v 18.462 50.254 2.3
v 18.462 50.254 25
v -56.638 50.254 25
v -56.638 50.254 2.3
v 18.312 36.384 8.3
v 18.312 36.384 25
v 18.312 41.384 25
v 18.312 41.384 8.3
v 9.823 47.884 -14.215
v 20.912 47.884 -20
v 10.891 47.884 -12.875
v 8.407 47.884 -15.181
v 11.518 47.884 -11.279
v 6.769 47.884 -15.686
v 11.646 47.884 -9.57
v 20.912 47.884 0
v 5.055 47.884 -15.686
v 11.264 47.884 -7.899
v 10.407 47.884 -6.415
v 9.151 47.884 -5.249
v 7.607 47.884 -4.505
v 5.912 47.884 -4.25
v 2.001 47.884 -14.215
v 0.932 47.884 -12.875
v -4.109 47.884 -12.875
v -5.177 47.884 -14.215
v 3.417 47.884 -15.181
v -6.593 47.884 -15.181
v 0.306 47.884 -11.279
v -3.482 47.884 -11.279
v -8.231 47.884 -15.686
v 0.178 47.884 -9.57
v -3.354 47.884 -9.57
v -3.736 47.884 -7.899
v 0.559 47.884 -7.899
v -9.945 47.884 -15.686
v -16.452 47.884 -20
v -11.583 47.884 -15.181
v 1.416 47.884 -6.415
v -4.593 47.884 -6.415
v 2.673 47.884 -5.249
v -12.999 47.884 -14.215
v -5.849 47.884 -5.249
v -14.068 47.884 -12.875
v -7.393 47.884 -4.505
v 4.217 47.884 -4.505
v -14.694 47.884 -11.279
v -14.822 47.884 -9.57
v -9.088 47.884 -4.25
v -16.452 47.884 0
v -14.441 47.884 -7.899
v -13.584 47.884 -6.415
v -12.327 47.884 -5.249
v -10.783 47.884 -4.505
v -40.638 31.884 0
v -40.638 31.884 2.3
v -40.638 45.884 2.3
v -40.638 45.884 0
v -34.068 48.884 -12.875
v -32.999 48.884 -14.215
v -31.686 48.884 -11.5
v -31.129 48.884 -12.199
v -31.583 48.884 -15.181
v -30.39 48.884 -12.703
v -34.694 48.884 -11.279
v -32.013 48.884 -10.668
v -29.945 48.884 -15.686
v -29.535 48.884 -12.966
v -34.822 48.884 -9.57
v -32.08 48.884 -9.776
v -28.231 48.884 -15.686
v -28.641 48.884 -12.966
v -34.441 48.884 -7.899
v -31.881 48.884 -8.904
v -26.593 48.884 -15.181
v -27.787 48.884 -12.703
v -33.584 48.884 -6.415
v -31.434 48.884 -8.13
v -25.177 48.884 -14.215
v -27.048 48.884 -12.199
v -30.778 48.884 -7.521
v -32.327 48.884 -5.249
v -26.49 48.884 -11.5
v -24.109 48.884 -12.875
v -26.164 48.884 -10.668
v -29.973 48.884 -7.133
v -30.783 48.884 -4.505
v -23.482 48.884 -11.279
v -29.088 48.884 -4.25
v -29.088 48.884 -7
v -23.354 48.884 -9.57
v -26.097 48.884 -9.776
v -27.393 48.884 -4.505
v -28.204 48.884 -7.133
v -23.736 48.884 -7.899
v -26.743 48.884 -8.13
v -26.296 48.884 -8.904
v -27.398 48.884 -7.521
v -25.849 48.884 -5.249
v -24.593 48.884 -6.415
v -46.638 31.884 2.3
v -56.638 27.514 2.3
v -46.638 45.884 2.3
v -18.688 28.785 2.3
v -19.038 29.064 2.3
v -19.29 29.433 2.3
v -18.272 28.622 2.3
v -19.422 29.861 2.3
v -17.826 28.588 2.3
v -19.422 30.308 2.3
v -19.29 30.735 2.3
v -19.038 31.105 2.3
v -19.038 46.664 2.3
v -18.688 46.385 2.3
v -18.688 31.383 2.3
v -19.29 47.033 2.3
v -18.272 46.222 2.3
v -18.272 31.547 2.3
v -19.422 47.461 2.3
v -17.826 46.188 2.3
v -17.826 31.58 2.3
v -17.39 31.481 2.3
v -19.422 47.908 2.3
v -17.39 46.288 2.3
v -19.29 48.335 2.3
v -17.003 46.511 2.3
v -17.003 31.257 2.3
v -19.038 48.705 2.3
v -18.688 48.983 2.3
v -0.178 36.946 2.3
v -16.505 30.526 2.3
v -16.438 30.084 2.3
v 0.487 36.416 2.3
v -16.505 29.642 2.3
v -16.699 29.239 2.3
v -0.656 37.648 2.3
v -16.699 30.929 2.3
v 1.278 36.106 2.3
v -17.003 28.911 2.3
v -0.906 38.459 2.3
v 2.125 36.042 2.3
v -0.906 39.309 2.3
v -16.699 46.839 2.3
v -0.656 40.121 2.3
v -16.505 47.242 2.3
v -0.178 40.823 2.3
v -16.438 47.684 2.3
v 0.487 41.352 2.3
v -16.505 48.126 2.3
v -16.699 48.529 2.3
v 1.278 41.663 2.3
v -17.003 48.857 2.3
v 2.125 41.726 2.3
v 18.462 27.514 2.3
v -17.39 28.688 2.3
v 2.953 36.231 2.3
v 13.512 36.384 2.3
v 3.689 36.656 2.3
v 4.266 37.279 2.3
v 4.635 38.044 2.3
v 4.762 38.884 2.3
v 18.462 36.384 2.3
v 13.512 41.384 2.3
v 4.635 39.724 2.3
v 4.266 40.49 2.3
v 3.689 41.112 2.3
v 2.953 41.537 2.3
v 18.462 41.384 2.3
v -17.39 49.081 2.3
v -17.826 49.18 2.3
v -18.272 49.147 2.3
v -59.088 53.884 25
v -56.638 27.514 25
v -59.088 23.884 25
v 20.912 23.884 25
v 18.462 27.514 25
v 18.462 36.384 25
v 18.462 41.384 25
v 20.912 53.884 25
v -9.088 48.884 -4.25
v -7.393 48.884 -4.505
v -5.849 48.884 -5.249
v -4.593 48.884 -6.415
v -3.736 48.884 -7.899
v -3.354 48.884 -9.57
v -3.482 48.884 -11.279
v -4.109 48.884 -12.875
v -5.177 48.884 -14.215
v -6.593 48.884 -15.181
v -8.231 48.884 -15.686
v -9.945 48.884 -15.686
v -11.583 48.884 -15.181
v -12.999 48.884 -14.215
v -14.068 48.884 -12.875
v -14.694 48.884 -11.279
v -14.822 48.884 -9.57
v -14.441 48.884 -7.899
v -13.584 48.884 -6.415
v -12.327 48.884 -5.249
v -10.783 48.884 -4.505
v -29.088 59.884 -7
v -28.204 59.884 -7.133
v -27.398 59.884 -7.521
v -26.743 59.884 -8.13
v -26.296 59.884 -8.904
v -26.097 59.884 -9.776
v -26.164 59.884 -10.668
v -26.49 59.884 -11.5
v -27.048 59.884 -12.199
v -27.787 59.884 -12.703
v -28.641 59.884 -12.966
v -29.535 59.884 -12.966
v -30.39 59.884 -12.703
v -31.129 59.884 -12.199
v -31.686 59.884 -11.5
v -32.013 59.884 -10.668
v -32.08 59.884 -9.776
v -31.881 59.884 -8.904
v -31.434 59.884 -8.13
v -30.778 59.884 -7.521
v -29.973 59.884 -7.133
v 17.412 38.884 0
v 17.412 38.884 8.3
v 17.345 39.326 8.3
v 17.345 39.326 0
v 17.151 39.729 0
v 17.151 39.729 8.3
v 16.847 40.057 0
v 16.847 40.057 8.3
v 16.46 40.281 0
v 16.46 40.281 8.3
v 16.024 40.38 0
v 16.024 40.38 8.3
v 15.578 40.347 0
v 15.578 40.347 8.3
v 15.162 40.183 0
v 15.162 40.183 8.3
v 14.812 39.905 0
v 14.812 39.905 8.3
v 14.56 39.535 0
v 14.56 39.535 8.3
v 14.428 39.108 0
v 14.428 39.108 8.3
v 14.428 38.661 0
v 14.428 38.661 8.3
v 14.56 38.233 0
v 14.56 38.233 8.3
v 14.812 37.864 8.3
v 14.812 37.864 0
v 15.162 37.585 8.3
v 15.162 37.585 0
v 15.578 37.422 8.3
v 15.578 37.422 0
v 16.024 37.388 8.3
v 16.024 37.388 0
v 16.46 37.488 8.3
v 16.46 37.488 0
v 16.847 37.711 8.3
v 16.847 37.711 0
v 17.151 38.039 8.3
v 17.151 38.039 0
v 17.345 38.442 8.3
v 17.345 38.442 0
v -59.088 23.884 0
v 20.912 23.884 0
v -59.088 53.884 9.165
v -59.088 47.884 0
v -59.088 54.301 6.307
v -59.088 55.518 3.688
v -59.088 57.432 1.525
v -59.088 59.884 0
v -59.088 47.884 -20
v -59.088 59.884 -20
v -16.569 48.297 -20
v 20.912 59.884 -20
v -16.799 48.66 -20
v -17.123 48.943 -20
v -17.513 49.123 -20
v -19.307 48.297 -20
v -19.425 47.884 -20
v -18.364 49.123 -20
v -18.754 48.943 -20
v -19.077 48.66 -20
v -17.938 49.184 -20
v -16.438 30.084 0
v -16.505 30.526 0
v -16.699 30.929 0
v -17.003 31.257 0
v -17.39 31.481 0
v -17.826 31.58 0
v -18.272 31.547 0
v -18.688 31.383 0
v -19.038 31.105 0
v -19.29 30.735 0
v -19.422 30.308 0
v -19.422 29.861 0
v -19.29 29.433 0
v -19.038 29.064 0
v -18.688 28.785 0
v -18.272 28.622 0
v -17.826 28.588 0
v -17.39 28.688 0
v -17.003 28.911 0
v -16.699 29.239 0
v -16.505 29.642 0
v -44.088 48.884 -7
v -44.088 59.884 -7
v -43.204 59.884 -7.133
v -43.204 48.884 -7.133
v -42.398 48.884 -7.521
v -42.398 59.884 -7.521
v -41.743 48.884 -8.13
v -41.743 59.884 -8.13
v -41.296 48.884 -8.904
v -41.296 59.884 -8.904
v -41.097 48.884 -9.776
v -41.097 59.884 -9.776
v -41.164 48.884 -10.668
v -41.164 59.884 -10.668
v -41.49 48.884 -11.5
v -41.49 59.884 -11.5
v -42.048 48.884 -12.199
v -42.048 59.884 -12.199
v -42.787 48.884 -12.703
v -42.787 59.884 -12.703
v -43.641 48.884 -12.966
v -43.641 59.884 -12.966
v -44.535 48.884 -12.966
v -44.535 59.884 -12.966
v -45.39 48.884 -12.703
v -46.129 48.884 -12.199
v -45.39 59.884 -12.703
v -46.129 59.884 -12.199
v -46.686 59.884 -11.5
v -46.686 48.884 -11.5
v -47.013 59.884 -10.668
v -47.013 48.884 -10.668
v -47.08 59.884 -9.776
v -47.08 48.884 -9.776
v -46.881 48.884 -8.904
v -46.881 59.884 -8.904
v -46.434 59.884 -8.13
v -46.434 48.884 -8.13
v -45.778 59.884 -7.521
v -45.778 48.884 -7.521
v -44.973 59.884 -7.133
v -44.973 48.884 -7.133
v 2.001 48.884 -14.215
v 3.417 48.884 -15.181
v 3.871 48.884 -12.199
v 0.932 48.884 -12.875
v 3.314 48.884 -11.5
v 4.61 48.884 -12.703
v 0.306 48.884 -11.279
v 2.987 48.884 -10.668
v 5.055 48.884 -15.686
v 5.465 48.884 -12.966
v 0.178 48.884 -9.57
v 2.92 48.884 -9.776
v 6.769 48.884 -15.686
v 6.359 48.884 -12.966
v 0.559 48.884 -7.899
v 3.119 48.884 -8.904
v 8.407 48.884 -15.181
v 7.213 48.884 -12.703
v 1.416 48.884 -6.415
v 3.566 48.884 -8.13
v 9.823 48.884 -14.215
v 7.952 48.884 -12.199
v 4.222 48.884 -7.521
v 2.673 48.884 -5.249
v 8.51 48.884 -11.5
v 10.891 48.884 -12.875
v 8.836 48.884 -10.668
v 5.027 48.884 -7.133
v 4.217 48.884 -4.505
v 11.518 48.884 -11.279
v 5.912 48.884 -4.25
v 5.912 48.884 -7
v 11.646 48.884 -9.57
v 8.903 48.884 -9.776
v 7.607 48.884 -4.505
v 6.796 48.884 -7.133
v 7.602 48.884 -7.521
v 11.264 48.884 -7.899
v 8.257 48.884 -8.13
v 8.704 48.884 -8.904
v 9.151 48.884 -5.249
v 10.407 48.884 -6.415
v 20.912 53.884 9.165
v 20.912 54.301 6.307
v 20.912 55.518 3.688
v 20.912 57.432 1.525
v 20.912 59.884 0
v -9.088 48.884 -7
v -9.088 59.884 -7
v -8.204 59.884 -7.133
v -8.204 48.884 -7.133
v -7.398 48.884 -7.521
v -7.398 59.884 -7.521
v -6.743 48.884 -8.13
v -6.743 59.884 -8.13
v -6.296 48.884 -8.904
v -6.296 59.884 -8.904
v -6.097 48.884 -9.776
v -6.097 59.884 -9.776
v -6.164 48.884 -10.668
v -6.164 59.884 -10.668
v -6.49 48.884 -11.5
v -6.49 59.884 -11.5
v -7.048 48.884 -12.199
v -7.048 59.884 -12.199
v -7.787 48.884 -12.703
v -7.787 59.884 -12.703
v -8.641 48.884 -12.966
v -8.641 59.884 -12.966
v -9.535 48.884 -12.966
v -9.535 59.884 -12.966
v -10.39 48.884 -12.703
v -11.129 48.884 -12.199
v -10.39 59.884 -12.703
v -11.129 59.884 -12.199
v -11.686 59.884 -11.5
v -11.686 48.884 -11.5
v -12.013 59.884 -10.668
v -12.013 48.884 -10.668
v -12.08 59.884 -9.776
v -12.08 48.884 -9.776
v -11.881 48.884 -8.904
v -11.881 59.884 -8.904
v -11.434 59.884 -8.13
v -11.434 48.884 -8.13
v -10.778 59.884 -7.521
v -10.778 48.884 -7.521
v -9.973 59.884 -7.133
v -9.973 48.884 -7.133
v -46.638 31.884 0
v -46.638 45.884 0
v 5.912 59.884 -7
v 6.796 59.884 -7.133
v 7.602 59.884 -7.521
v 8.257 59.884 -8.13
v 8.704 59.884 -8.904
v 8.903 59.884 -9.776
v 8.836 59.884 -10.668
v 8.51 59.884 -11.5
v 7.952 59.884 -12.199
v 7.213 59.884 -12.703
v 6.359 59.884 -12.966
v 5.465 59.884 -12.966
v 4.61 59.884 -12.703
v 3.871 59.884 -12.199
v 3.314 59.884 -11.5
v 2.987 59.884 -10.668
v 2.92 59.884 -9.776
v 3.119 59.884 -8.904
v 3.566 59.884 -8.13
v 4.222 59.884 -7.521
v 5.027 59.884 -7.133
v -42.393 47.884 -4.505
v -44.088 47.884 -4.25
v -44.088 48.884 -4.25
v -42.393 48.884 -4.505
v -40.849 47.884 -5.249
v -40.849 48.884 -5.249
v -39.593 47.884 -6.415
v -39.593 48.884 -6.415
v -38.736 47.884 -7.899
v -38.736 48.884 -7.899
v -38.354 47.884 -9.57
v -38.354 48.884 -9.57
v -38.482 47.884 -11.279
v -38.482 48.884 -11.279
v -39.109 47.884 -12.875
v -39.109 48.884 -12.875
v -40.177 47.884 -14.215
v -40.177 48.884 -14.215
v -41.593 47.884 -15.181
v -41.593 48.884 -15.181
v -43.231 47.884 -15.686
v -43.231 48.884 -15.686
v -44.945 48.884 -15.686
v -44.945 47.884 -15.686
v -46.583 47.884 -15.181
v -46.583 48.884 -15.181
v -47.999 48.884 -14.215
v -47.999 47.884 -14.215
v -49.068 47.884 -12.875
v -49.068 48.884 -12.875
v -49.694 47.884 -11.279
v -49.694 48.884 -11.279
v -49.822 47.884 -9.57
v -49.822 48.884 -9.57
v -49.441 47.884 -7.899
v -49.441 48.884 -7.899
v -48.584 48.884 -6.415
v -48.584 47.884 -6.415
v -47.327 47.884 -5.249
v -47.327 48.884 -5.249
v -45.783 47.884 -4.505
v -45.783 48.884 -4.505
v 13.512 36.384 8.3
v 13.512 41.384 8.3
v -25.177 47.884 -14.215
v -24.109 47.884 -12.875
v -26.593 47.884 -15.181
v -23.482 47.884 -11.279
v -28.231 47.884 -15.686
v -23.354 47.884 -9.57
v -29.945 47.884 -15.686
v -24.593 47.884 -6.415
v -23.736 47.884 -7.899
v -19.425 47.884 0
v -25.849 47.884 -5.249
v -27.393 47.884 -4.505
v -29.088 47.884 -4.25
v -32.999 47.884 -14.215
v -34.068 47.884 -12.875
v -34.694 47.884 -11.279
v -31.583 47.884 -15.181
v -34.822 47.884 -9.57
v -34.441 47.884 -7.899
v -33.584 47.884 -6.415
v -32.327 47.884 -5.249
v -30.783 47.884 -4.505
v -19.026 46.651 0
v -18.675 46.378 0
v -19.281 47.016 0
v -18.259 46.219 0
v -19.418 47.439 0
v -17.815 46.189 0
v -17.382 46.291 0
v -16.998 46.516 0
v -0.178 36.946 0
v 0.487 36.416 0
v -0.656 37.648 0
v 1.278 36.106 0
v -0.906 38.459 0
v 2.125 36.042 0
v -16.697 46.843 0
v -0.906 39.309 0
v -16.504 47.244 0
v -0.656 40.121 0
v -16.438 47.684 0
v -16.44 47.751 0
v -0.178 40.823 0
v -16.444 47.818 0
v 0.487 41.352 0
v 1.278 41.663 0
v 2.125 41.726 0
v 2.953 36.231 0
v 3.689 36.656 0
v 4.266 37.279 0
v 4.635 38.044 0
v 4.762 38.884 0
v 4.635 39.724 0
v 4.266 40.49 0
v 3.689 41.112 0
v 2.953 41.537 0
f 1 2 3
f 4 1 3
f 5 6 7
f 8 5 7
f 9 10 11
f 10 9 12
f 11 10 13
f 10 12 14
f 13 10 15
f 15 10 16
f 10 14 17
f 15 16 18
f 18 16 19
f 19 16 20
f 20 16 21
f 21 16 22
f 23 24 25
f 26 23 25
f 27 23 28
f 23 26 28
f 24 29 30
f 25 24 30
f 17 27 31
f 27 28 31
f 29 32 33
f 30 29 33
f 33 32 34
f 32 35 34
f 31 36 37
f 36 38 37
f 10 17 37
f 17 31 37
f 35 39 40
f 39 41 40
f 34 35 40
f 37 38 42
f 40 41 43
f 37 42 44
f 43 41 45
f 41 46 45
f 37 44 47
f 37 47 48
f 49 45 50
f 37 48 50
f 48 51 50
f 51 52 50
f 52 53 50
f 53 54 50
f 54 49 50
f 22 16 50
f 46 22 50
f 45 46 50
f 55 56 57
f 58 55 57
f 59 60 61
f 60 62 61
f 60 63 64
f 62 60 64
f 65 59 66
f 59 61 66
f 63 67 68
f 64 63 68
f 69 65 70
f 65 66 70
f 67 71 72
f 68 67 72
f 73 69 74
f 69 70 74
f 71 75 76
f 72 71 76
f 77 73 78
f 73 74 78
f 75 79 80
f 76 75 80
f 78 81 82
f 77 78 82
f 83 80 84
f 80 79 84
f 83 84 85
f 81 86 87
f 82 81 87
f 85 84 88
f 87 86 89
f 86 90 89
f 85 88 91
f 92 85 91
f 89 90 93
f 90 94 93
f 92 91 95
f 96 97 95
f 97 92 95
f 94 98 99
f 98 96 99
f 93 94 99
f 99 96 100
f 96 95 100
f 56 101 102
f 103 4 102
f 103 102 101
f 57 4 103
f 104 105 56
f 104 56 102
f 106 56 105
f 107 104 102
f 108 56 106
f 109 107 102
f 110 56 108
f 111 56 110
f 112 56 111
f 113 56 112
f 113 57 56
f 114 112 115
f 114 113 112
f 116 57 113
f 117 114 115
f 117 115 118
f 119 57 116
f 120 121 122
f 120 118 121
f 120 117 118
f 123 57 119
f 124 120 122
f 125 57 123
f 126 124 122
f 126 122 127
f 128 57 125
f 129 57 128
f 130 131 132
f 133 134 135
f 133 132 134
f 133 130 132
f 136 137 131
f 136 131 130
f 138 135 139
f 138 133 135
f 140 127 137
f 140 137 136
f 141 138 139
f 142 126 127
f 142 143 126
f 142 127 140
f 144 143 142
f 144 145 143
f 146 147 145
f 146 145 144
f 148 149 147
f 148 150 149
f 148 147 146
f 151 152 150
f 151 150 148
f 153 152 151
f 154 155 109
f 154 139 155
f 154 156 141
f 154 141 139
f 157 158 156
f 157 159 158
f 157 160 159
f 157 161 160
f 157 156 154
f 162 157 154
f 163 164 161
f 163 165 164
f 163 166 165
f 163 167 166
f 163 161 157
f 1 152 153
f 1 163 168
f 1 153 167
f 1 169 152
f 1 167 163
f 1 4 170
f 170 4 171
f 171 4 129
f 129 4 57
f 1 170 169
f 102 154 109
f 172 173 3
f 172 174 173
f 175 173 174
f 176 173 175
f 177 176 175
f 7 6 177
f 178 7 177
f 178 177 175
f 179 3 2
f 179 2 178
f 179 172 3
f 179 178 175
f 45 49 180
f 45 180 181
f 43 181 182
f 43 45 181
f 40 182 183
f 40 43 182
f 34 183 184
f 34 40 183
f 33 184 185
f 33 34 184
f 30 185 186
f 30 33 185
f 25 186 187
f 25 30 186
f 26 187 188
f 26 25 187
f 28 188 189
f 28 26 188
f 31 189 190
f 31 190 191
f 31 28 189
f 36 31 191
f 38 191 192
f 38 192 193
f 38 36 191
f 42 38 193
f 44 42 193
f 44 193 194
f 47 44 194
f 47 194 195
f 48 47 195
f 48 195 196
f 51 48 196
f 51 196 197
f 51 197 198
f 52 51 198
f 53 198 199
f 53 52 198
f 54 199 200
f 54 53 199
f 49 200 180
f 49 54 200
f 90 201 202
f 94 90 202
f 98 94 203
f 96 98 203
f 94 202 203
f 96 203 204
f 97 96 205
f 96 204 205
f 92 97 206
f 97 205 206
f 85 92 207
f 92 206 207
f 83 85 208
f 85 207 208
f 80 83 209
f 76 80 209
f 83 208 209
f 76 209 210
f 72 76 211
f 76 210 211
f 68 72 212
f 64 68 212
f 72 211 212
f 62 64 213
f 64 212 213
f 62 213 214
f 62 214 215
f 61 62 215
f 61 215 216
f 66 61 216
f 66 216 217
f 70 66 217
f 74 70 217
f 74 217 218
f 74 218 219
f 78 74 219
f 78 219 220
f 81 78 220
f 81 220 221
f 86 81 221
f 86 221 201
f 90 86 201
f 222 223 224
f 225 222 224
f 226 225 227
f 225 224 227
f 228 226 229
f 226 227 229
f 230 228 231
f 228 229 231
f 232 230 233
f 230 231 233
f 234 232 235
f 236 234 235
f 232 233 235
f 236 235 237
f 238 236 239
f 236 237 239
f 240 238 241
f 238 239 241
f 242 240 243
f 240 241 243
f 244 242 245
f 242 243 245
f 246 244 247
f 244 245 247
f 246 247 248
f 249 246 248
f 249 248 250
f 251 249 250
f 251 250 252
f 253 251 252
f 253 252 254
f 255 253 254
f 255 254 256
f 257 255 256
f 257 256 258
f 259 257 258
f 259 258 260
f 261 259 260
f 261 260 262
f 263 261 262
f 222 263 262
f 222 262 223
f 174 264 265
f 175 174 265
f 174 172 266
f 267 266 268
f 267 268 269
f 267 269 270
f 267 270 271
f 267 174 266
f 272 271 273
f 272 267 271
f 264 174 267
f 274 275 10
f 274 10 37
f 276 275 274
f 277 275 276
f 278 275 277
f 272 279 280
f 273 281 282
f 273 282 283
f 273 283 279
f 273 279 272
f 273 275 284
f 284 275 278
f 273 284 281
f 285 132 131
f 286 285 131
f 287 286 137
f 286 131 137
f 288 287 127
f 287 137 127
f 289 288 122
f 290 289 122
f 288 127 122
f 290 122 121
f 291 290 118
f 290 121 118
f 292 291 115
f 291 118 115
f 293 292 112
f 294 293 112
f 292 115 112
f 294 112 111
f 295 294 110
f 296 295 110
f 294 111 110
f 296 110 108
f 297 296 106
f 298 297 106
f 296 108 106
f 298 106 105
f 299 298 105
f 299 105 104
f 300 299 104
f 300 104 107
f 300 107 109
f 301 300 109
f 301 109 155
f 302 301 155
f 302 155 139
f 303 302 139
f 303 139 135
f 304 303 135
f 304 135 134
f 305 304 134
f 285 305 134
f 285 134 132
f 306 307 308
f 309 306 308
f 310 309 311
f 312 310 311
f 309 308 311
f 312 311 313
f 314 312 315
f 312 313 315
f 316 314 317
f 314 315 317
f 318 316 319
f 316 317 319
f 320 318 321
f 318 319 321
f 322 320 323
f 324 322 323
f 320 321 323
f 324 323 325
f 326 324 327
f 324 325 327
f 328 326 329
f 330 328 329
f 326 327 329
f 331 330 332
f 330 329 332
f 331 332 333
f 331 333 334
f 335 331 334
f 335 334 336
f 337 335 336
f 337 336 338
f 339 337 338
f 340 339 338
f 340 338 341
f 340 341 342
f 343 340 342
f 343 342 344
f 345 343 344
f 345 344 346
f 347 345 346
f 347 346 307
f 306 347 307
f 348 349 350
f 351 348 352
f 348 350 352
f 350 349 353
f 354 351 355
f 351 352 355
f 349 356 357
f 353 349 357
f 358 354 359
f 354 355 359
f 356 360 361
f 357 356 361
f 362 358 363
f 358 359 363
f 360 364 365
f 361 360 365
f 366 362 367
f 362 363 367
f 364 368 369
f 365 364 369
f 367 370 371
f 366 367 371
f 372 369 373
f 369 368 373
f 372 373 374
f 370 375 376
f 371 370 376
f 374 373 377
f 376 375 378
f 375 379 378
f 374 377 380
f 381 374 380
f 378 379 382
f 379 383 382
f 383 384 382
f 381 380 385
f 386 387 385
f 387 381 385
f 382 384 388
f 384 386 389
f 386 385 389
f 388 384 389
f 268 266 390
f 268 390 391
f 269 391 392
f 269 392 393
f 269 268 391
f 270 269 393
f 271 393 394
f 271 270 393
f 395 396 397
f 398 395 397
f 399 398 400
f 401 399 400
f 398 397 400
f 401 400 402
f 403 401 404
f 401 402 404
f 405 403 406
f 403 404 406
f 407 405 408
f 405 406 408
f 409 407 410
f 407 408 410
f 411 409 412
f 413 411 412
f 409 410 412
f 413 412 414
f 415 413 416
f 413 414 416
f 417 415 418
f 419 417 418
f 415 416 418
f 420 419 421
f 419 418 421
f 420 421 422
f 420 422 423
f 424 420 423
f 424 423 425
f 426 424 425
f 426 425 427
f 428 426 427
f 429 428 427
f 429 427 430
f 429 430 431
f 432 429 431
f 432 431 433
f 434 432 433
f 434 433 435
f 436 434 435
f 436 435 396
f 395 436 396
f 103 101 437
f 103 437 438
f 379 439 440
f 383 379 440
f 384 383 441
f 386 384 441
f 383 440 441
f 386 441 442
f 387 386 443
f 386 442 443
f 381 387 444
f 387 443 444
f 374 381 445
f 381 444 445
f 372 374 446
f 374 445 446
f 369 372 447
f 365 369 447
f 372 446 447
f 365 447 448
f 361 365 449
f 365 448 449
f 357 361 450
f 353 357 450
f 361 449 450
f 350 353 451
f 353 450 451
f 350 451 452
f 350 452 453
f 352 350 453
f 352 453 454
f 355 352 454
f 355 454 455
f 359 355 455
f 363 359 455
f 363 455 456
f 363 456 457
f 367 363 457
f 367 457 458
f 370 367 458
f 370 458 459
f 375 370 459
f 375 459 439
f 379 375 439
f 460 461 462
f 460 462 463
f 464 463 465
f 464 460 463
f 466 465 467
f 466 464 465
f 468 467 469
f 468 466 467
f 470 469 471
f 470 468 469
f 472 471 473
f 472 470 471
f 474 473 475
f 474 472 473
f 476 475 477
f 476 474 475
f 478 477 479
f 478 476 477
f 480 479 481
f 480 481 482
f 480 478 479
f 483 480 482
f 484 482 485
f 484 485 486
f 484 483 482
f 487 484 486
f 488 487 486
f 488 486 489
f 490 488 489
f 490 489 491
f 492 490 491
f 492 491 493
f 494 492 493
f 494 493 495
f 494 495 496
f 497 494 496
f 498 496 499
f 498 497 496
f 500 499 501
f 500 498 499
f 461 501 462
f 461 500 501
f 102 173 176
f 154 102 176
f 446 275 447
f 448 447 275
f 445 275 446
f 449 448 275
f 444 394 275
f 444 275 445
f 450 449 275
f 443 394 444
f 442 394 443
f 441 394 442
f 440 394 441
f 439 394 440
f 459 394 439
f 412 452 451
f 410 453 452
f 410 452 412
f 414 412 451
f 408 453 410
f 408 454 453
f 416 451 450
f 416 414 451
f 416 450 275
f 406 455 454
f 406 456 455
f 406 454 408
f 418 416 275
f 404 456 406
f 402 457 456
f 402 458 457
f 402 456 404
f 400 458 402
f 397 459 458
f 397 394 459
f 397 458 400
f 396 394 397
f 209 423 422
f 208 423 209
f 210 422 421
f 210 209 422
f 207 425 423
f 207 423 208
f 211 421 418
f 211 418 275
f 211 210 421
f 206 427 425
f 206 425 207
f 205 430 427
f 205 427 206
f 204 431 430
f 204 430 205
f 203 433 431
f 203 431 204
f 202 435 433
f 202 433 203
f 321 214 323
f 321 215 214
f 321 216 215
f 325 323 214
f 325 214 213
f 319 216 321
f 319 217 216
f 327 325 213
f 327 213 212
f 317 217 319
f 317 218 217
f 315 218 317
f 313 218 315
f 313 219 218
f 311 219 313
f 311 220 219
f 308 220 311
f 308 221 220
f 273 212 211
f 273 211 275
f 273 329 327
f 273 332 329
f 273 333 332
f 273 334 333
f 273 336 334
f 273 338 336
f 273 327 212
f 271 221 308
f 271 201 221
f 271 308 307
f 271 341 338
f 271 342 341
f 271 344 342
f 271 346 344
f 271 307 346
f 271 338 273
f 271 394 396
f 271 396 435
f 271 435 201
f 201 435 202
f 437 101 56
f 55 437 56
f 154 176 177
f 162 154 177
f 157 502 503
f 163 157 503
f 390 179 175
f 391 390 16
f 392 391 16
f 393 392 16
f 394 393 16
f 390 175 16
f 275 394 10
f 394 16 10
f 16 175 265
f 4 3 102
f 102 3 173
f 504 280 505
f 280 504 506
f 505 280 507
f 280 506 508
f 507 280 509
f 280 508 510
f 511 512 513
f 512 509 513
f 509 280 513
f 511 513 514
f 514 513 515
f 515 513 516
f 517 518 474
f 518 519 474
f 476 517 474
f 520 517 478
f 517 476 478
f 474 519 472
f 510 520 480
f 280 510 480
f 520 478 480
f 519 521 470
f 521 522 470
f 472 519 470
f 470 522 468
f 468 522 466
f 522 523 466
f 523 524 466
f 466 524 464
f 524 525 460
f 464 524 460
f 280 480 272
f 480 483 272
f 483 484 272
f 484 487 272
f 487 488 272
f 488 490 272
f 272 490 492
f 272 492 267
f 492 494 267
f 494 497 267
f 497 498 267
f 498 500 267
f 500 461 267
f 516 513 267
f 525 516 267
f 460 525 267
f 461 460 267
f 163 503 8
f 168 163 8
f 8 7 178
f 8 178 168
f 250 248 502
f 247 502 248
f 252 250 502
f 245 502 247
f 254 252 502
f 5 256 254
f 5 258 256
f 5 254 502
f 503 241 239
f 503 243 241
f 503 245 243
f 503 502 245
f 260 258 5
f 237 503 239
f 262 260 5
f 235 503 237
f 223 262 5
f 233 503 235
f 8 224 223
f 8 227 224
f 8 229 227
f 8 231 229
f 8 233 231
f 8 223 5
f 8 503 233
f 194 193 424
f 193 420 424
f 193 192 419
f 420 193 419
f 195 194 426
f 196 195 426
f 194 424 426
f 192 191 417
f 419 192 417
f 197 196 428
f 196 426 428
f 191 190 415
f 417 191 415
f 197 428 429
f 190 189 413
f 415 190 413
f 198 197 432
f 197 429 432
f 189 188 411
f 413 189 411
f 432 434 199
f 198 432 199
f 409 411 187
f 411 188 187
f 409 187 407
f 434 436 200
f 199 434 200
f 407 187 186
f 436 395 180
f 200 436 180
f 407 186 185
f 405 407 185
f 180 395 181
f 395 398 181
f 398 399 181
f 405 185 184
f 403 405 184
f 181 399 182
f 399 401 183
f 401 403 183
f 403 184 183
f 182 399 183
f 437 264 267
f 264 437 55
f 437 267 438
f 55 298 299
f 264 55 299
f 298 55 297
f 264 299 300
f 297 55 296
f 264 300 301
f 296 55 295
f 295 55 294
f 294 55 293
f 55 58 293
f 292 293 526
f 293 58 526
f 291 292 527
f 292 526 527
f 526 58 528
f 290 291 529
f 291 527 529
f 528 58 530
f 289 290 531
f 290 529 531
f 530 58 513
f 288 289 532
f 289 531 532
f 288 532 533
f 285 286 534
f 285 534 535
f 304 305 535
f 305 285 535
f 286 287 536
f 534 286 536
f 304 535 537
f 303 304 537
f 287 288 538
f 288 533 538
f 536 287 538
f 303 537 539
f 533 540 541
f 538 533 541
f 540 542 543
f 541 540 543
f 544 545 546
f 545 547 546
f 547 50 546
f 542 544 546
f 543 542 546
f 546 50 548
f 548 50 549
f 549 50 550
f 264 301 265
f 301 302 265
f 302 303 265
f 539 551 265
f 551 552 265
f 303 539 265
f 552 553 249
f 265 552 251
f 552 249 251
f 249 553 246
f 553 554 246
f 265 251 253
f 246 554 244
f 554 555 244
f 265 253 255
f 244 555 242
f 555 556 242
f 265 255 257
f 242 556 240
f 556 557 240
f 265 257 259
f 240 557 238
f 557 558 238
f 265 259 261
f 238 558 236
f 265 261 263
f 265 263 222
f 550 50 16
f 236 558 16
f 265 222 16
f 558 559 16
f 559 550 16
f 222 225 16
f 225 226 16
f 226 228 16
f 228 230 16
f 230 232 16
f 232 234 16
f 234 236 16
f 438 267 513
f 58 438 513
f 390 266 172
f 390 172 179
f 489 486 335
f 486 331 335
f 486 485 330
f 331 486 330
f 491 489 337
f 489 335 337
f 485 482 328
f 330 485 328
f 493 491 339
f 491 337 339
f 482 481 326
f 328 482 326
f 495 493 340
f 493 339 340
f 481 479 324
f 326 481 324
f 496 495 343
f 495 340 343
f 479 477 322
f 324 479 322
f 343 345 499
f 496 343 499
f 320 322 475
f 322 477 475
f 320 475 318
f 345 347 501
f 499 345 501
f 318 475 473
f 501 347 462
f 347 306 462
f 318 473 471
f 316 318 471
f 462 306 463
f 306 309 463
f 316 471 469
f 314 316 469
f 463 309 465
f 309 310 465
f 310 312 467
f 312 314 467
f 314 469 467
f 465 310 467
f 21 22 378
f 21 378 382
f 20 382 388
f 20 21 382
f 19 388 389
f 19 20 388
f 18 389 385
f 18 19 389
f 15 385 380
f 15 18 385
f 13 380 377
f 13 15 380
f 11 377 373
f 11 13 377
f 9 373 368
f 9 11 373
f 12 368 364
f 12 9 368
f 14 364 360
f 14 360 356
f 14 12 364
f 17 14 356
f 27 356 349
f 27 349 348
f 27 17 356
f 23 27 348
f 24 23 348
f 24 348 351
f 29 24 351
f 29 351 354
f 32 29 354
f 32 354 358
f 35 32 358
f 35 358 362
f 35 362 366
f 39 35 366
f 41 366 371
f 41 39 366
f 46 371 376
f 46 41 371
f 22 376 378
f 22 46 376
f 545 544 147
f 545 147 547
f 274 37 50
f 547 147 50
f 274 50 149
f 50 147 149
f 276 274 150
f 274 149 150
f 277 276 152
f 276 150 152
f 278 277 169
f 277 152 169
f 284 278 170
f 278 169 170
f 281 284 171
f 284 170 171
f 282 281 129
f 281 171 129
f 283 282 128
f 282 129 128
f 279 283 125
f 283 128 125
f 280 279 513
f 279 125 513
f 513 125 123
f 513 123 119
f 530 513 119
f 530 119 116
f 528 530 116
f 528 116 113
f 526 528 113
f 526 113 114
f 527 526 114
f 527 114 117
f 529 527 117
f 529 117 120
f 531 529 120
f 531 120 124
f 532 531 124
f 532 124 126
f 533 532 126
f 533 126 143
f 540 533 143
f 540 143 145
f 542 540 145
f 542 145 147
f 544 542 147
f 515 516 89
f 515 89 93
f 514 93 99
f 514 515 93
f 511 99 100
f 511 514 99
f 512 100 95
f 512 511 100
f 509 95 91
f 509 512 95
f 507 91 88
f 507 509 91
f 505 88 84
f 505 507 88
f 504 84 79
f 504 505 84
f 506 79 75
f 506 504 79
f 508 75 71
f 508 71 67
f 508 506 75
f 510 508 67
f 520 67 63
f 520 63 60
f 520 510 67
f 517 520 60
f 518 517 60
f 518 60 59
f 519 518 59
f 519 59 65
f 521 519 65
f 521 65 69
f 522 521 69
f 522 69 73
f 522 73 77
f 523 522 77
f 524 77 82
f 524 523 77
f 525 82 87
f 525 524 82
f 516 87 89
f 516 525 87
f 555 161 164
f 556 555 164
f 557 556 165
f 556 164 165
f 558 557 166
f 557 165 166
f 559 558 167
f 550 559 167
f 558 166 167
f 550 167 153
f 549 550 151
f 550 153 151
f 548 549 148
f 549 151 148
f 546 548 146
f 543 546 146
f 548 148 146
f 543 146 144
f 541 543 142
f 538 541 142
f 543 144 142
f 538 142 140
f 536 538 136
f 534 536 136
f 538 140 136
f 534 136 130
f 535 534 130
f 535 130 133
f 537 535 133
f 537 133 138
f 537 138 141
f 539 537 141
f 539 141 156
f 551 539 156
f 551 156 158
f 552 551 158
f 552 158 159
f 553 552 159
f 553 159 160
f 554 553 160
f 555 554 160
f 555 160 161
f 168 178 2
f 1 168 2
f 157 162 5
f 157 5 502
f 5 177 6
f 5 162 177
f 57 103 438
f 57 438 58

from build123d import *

# Parameters (mm, degrees)
SKETCH1_W                 = 80
SKETCH1_H                 = 30
MOTOR_HOUSING_DEPTH       = 25
SKETCH2_W                 = 80
SKETCH2_H                 = 6
ATATACH_TO_BODY_R_DEPTH   = 20
FILLET_R_R                = 10
SCREW_START               = -12
SKETCH3_R                 = 5.75
SKETCH3_R_2               = 3
SCREW_HEAD_INSETS_R_DEPTH = 1
SKETCH3_2_R               = 3
SCREW_HOLES_R_DEPTH       = 74.569203879
SKETCH4_R                 = 1.5
SKETCH4_R_2               = 2.85
SKETCH4_W                 = 6
SKETCH4_H                 = 14
MOTOR_HOLES_DEPTH         = 96.407286673
SKETCH4_3_R               = 1.5
SKETCH4_3_R_2             = 2.85
SKETCH4_3_W               = 6
SKETCH4_3_H               = 14
MOTOR_CAVITY_DEPTH        = 22.7
SKETCH4_4_W               = 4.8
SKETCH4_4_H               = 5
SKETCH4_4_R               = 1.5
MOUNT_STABILITY_DEPTH     = 16.7


with BuildPart() as part:
    # Sketch1 → Motor Housing (new body)
    with BuildSketch(Plane.XY):
        with Locations((-19.08830476, 38.88424326)):
            Rectangle(SKETCH1_W, SKETCH1_H)
    extrude(amount=MOTOR_HOUSING_DEPTH)

    # Sketch2 → Atatach to Body R (add)
    with BuildSketch(Plane(origin=(0, 0, 0), x_dir=(-1, 0, 0), z_dir=(0, 0, -1))):
        with Locations((19.08830476, 50.88424326)):
            Rectangle(SKETCH2_W, SKETCH2_H)
        with Locations((19.08830476, 56.88424326)):
            Rectangle(SKETCH2_W, SKETCH2_H)
    extrude(amount=ATATACH_TO_BODY_R_DEPTH)

    # Fillet R
    # the kernel refuses this fillet: 10 mm, written as the material it adds along each edge
    with BuildSketch(Plane(origin=(-59.08830476, 53.88424326, 0), x_dir=(0, 0, 1), z_dir=(1, 0, 0))) as fillet_r_piece_1:
        with BuildLine():
            CenterArc((9.16515139, -10), FILLET_R_R, 90, 66.421821522)
            Line((0, -6), (-0.183303028, -5.92))
            ThreePointArc((-0.183303028, -5.92), (-0.2, -3), (-0.2, 0))
            Line((-0.2, 0), (0, 0.2))
            Line((0, 0.2), (9.16515139, 0.2))
            Line((9.16515139, 0.2), (9.16515139, 0))
        make_face()
    extrude(amount=80)

    # Sketch3 → Screw Head Insets R (cut)
    # profile 1 of 4: a face of its own
    with BuildSketch(Plane(origin=(0, 59.88424326, 0), x_dir=(1, 0, 0), z_dir=(0, 1, 0)).offset(SCREW_START)):
        with Locations(Location((-44.08830476, 10, 0), (0, 0, 270))):
            Circle(SKETCH3_R)
        with Locations(Location((-44.08830476, 10, 0), (0, 0, 270))):
            Circle(SKETCH3_R_2, mode=Mode.SUBTRACT)
    # profile 2 of 4: a face of its own
    with BuildSketch(Plane(origin=(0, 59.88424326, 0), x_dir=(1, 0, 0), z_dir=(0, 1, 0)).offset(SCREW_START)):
        with Locations(Location((-29.08830476, 10, 0), (0, 0, 270))):
            Circle(SKETCH3_R)
        with Locations(Location((-29.08830476, 10, 0), (0, 0, 270))):
            Circle(SKETCH3_R_2, mode=Mode.SUBTRACT)
    # profile 3 of 4: a face of its own
    with BuildSketch(Plane(origin=(0, 59.88424326, 0), x_dir=(1, 0, 0), z_dir=(0, 1, 0)).offset(SCREW_START)):
        with Locations(Location((5.91169524, 10, 0), (0, 0, 270))):
            Circle(SKETCH3_R)
        with Locations(Location((5.91169524, 10, 0), (0, 0, 270))):
            Circle(SKETCH3_R_2, mode=Mode.SUBTRACT)
    # profile 4 of 4: a face of its own
    with BuildSketch(Plane(origin=(0, 59.88424326, 0), x_dir=(1, 0, 0), z_dir=(0, 1, 0)).offset(SCREW_START)):
        with Locations(Location((-9.08830476, 10, 0), (0, 0, 270))):
            Circle(SKETCH3_R)
        with Locations(Location((-9.08830476, 10, 0), (0, 0, 270))):
            Circle(SKETCH3_R_2, mode=Mode.SUBTRACT)
    extrude(amount=SCREW_HEAD_INSETS_R_DEPTH, mode=Mode.SUBTRACT)

    # Sketch3<2> → Screw Holes R (cut, through all)
    with BuildSketch(Plane(origin=(0, 59.88424326, 0), x_dir=(1, 0, 0), z_dir=(0, 1, 0))):
        with Locations(Location((5.91169524, 10, 0), (0, 0, 270))):
            Circle(SKETCH3_2_R)
        with Locations(Location((-9.08830476, 10, 0), (0, 0, 270))):
            Circle(SKETCH3_2_R)
        with Locations(Location((-29.08830476, 10, 0), (0, 0, 270))):
            Circle(SKETCH3_2_R)
        with Locations(Location((-44.08830476, 10, 0), (0, 0, 270))):
            Circle(SKETCH3_2_R)
    extrude(amount=-SCREW_HOLES_R_DEPTH, mode=Mode.SUBTRACT)

    # Sketch4 → Motor Holes (cut, through all)
    with BuildSketch(Plane.XY.offset(25)):
        with Locations((-17.93830476, 47.68424326)):
            Circle(SKETCH4_R)
        with Locations((-17.93830476, 30.08424326)):
            Circle(SKETCH4_R)
        with Locations((1.91169524, 38.88424326)):
            Circle(SKETCH4_R_2)
        with Locations((15.91169524, 38.88424326)):
            Circle(SKETCH4_R)
        with Locations((-43.63830476, 38.88424326)):
            Rectangle(SKETCH4_W, SKETCH4_H)
    extrude(amount=-MOTOR_HOLES_DEPTH, mode=Mode.SUBTRACT)

    # Sketch4<3> → Motor Cavity (cut)
    with BuildSketch(Plane.XY.offset(25)):
        Polygon((18.46169524, 50.25424326), (-56.63830476, 50.25424326), (-56.63830476, 27.51424326), (18.46169524, 27.51424326), (18.46169524, 36.38424326), (18.31169524, 36.38424326), (13.51169524, 36.38424326), (13.51169524, 41.38424326), (18.31169524, 41.38424326), (18.46169524, 41.38424326), align=None)
        with Locations((-17.93830476, 30.08424326)):
            Circle(SKETCH4_3_R, mode=Mode.SUBTRACT)
        with Locations((1.91169524, 38.88424326)):
            Circle(SKETCH4_3_R_2, mode=Mode.SUBTRACT)
        with Locations((-43.63830476, 38.88424326)):
            Rectangle(SKETCH4_3_W, SKETCH4_3_H, mode=Mode.SUBTRACT)
        with Locations((-17.93830476, 47.68424326)):
            Circle(SKETCH4_3_R, mode=Mode.SUBTRACT)
    extrude(amount=-MOTOR_CAVITY_DEPTH, mode=Mode.SUBTRACT)

    # Sketch4<4> → Mount Stability (cut)
    with BuildSketch(Plane.XY.offset(25)):
        with Locations((15.91169524, 38.88424326)):
            Rectangle(SKETCH4_4_W, SKETCH4_4_H)
        with Locations((15.91169524, 38.88424326)):
            Circle(SKETCH4_4_R, mode=Mode.SUBTRACT)
    extrude(amount=-MOUNT_STABILITY_DEPTH, mode=Mode.SUBTRACT)


solid = part.part
